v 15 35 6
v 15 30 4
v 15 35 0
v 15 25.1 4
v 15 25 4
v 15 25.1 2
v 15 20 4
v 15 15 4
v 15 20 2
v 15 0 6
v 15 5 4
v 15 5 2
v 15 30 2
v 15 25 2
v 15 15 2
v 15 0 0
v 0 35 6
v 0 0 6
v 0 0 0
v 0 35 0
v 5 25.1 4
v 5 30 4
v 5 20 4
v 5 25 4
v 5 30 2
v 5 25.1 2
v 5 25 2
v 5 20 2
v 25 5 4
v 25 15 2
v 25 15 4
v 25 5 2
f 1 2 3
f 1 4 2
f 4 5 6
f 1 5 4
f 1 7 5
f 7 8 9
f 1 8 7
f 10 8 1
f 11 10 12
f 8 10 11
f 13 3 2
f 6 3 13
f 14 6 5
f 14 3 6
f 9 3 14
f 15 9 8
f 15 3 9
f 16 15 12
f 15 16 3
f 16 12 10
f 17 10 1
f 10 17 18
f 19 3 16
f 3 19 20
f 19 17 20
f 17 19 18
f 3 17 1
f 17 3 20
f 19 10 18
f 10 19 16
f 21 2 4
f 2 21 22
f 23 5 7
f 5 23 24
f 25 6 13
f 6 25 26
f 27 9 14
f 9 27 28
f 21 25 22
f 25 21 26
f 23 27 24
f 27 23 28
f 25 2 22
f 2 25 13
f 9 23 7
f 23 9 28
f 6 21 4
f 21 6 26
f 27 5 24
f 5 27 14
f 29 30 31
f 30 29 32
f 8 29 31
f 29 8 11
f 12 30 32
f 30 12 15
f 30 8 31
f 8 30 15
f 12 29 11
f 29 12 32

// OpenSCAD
languette_width=10;
languette_depth=10;
languette_height=2;
languette_distance=5;
support_depth=0.1;
support_distance=5;

module languette(width, depth, height) {
    cube([width, depth, height]);
}

module support_languette(width, depth, height) {
    for(i=[1:depth/support_distance]) {
        translate([0,support_distance*i,0]){
            cube([width, support_depth, height]);
        }
    }
}

difference() {
    cube([languette_width*3/2,languette_depth*2+languette_distance*3, languette_height*3]);
    translate([languette_width*1/2,languette_distance*2+languette_depth, languette_height]){
        languette(languette_width,languette_depth,languette_height);
    }
}
translate([languette_width*1/2,languette_distance*2+languette_depth, languette_height]){
    support_languette(languette_width,languette_depth,languette_height);
}

translate([languette_width*3/2,languette_distance, languette_height]){
    languette(languette_width,languette_depth,languette_height);
}
